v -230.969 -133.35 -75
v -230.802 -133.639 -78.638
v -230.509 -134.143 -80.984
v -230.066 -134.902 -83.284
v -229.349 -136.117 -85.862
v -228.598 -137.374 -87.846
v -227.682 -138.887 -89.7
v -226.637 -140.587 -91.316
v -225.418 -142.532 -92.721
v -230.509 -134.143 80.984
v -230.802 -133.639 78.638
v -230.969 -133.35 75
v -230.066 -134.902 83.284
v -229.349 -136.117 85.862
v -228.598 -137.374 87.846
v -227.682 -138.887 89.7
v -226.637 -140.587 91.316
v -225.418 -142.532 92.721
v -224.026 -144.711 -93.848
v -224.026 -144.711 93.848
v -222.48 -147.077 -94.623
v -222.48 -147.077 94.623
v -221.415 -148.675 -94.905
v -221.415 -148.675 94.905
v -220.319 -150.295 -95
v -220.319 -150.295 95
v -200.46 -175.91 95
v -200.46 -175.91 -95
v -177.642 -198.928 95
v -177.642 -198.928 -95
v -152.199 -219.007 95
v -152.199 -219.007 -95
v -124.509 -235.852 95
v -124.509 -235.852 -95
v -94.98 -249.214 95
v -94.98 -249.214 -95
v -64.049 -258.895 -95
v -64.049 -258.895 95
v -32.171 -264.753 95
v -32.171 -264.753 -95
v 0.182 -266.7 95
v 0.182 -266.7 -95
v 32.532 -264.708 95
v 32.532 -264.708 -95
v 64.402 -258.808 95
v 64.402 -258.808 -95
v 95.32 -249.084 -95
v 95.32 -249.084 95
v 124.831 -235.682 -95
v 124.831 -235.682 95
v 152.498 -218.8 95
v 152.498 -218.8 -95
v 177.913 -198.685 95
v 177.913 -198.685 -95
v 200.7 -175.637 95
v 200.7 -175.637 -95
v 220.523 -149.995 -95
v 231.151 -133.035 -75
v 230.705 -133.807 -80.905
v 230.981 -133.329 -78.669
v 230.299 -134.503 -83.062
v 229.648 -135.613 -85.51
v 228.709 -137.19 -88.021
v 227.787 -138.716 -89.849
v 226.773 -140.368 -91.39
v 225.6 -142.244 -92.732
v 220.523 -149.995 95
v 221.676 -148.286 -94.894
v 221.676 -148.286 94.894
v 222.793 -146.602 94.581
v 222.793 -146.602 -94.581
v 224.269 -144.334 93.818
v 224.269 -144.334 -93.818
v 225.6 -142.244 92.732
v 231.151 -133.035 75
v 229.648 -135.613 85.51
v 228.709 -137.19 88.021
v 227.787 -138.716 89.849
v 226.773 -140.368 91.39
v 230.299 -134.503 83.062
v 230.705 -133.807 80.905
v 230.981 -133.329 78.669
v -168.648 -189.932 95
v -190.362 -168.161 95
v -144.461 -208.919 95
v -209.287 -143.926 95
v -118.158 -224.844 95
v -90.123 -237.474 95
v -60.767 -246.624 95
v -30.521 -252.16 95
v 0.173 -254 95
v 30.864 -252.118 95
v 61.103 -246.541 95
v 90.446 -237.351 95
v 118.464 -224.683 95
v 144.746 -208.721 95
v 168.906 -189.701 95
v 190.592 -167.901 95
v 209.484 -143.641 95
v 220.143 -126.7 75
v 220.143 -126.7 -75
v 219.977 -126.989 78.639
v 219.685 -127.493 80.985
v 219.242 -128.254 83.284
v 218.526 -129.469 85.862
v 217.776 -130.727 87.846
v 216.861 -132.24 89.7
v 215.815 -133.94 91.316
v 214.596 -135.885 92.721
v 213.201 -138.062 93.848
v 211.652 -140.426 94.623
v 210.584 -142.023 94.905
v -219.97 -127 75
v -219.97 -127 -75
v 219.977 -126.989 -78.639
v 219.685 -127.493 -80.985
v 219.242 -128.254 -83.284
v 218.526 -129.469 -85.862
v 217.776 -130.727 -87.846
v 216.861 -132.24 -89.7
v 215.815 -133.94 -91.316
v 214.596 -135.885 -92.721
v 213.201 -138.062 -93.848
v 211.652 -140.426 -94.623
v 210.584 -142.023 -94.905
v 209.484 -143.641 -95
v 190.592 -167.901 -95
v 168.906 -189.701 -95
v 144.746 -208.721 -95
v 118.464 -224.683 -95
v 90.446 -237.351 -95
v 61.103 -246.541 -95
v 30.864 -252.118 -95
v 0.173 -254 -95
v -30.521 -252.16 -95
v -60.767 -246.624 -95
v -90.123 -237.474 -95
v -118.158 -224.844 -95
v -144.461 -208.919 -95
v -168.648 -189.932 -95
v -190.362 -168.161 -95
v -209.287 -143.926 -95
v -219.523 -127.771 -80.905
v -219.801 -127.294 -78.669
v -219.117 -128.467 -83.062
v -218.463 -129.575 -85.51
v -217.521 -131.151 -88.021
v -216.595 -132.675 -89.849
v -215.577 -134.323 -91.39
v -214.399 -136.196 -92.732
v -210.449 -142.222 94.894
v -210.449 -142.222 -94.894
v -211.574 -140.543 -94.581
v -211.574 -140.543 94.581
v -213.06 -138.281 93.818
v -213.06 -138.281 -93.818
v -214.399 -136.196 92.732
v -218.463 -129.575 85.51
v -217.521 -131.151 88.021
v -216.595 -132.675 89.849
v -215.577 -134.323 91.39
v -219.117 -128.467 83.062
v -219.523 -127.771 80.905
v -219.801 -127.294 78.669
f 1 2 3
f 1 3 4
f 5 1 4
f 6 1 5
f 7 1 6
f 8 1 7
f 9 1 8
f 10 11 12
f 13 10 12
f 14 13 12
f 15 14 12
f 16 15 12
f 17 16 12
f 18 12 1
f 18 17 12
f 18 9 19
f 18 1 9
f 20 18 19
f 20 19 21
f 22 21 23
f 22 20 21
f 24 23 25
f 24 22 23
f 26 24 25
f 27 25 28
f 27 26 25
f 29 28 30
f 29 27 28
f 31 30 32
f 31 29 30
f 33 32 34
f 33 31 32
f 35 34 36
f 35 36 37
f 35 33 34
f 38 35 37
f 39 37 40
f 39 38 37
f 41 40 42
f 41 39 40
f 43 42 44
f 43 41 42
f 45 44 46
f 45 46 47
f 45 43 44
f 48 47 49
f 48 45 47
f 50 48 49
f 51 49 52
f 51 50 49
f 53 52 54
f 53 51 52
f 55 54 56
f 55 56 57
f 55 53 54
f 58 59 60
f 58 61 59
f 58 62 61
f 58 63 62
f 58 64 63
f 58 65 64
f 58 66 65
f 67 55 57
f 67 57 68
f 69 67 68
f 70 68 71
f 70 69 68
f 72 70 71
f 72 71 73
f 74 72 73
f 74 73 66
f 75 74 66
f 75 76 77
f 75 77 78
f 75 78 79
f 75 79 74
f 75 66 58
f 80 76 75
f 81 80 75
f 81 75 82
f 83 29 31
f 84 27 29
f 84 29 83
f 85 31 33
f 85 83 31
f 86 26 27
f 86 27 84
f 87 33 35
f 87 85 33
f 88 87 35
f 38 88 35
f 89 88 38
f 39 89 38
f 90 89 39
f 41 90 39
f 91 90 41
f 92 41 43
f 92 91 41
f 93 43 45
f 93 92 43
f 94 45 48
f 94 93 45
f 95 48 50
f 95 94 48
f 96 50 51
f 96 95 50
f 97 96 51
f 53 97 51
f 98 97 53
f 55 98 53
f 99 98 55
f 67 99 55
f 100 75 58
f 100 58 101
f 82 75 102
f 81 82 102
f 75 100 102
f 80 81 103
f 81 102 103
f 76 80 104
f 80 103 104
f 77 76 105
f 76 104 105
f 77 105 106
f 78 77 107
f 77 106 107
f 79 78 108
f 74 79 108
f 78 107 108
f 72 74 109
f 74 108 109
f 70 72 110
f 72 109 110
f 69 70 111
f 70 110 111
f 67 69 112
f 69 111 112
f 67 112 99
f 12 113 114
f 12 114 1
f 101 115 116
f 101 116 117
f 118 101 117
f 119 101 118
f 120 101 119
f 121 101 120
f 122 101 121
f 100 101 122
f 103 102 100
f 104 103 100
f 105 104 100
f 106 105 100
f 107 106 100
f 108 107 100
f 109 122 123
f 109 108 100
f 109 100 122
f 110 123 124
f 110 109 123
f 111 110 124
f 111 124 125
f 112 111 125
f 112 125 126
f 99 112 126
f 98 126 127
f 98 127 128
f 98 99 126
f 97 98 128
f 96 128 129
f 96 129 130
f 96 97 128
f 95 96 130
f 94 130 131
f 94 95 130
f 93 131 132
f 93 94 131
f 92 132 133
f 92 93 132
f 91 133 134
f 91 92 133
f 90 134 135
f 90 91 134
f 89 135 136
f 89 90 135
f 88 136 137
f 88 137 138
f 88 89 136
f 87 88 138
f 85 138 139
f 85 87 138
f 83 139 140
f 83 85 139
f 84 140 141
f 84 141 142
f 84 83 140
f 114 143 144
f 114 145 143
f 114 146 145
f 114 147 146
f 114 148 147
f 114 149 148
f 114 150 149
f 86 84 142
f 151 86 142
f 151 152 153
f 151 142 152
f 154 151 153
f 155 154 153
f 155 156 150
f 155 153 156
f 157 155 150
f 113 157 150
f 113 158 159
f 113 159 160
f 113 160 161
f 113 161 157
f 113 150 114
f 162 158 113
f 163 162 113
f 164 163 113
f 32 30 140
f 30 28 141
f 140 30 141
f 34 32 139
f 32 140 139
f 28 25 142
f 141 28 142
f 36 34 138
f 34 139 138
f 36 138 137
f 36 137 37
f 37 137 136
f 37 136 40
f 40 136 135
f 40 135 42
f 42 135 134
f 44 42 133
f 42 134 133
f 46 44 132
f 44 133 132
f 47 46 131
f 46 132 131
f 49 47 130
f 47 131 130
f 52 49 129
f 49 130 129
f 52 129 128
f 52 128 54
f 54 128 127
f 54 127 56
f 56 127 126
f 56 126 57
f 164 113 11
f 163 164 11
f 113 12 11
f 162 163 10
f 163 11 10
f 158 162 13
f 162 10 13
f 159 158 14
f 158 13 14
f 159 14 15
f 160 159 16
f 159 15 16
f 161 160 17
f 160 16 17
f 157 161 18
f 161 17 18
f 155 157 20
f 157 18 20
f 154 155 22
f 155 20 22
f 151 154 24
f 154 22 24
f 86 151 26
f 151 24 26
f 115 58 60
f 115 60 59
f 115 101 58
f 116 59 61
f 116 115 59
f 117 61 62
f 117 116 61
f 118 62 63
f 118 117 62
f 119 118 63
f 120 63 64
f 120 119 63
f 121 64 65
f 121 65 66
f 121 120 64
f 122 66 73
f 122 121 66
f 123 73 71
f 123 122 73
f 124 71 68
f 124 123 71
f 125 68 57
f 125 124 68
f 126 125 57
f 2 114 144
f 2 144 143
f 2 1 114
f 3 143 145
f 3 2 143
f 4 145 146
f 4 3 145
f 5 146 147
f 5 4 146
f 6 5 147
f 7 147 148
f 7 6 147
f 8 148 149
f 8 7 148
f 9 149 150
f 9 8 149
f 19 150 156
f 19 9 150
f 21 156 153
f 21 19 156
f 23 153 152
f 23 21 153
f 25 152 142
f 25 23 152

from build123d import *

# Parameters (mm, degrees)
BOSS_EXTRUDE1_DEPTH = 95
FILLET1_R           = 20


with BuildPart() as part:
    # Sketch1 → Boss-Extrude1 (new, symmetric)
    with BuildSketch(Plane.XY):
        with BuildLine():
            Line((-219.970452561, -127), (-230.968975189, -133.35))
            ThreePointArc((-230.968975189, -133.35), (0.181793833, -266.699938041), (231.150554347, -133.035))
            Line((231.150554347, -133.035), (220.143385093, -126.7))
            ThreePointArc((220.143385093, -126.7), (0.173136984, -253.999940991), (-219.970452561, -127))
        make_face()
    extrude(amount=BOSS_EXTRUDE1_DEPTH, both=True)

    # Fillet1
    fillet1_edges = [part.edges().sort_by_distance(p)[0] for p in [
        (225.64696972, -129.8675, 95),
        (225.64696972, -129.8675, -95),
        (-225.469713875, -130.175, -95),
        (-225.469713875, -130.175, 95),
    ]]
    fillet(fillet1_edges, radius=FILLET1_R)


solid = part.part
